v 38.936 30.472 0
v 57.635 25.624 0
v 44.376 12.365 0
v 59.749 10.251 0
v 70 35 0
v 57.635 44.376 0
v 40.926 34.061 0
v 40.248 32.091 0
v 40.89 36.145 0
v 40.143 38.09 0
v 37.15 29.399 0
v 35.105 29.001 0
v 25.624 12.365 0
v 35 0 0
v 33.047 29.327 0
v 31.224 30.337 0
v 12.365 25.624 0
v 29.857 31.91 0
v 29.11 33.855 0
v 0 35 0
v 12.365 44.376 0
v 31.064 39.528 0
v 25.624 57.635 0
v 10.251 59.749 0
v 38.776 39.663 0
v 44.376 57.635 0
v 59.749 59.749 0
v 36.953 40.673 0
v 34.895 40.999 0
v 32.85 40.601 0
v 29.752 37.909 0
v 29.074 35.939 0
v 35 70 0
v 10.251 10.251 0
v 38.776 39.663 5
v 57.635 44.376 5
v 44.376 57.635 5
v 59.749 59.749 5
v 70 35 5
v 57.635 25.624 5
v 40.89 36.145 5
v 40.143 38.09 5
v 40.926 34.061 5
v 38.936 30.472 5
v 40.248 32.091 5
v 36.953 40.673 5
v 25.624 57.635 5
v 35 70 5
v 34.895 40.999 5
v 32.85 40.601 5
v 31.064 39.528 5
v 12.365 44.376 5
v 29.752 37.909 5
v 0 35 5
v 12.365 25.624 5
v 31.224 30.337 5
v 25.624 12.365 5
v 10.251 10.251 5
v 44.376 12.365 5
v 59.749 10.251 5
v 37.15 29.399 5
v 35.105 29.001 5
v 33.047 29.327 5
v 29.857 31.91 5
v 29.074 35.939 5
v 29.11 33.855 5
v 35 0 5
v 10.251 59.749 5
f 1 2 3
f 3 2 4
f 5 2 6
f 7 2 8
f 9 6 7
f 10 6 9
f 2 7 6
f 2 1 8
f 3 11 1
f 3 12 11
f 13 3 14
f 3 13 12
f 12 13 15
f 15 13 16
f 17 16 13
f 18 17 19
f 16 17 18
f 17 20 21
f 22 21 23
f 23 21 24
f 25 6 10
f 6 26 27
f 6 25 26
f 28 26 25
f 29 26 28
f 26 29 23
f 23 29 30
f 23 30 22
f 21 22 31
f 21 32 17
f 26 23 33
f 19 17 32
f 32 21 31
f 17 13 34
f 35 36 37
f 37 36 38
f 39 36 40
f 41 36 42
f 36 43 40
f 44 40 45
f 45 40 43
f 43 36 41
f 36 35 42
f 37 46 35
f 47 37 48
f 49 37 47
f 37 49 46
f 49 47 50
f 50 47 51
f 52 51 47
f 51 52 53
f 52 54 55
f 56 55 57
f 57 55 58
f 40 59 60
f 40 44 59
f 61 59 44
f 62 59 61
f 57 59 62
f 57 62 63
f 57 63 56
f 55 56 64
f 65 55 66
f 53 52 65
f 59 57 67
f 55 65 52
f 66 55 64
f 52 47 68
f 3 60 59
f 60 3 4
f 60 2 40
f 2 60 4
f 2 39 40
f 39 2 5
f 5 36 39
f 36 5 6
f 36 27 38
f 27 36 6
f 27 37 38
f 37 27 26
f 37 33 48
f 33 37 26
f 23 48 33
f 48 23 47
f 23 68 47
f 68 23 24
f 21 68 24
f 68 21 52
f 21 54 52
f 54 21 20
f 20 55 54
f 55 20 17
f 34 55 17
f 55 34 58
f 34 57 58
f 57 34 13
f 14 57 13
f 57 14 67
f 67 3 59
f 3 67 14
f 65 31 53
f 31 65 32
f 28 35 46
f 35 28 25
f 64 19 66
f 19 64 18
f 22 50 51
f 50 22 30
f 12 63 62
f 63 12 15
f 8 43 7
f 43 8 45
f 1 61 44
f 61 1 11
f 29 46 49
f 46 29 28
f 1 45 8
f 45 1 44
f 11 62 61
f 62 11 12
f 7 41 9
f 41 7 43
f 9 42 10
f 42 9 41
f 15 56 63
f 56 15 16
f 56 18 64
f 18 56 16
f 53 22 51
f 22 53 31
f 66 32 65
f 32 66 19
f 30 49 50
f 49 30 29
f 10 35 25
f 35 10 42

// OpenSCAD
$fn = 32;

// ----------------------------------------------------------------------
// Star wheel: 8-point blunt, R35
// ----------------------------------------------------------------------

// --- parameters (mm) ---
n_points = 8;             // number of points / teeth
r_out = 35;               // tip radius
r_in = 24.5;              // root radius
bore_r = 6;               // centre bore radius
plate_t = 5;              // plate thickness, Z (extrusion height)
bore_d = 12;              // centre bore diameter

profile = [[70, 35], [57.635, 44.376], [59.749, 59.749], [44.376, 57.635], [35, 70], [25.624, 57.635], [10.251, 59.749], [12.365, 44.376], [0, 35], [12.365, 25.624], [10.251, 10.251], [25.624, 12.365], [35, 0], [44.376, 12.365], [59.749, 10.251], [57.635, 25.624]];  // primary outline, 16 points, counter clockwise
void_1 = [[40.89, 36.145], [40.143, 38.09], [38.776, 39.663], [36.953, 40.673], [34.895, 40.999], [32.85, 40.601], [31.064, 39.528], [29.752, 37.909], [29.074, 35.939], [29.11, 33.855], [29.857, 31.91], [31.224, 30.337], [33.047, 29.327], [35.105, 29.001], [37.15, 29.399], [38.936, 30.472], [40.248, 32.091], [40.926, 34.061]];  // centre bore, 18 points

// --- the one profile operation ---
difference() {
  linear_extrude(height = plate_t) polygon(points = profile);
  translate([0, 0, -1])
    linear_extrude(height = plate_t + 2) polygon(points = void_1);
}
